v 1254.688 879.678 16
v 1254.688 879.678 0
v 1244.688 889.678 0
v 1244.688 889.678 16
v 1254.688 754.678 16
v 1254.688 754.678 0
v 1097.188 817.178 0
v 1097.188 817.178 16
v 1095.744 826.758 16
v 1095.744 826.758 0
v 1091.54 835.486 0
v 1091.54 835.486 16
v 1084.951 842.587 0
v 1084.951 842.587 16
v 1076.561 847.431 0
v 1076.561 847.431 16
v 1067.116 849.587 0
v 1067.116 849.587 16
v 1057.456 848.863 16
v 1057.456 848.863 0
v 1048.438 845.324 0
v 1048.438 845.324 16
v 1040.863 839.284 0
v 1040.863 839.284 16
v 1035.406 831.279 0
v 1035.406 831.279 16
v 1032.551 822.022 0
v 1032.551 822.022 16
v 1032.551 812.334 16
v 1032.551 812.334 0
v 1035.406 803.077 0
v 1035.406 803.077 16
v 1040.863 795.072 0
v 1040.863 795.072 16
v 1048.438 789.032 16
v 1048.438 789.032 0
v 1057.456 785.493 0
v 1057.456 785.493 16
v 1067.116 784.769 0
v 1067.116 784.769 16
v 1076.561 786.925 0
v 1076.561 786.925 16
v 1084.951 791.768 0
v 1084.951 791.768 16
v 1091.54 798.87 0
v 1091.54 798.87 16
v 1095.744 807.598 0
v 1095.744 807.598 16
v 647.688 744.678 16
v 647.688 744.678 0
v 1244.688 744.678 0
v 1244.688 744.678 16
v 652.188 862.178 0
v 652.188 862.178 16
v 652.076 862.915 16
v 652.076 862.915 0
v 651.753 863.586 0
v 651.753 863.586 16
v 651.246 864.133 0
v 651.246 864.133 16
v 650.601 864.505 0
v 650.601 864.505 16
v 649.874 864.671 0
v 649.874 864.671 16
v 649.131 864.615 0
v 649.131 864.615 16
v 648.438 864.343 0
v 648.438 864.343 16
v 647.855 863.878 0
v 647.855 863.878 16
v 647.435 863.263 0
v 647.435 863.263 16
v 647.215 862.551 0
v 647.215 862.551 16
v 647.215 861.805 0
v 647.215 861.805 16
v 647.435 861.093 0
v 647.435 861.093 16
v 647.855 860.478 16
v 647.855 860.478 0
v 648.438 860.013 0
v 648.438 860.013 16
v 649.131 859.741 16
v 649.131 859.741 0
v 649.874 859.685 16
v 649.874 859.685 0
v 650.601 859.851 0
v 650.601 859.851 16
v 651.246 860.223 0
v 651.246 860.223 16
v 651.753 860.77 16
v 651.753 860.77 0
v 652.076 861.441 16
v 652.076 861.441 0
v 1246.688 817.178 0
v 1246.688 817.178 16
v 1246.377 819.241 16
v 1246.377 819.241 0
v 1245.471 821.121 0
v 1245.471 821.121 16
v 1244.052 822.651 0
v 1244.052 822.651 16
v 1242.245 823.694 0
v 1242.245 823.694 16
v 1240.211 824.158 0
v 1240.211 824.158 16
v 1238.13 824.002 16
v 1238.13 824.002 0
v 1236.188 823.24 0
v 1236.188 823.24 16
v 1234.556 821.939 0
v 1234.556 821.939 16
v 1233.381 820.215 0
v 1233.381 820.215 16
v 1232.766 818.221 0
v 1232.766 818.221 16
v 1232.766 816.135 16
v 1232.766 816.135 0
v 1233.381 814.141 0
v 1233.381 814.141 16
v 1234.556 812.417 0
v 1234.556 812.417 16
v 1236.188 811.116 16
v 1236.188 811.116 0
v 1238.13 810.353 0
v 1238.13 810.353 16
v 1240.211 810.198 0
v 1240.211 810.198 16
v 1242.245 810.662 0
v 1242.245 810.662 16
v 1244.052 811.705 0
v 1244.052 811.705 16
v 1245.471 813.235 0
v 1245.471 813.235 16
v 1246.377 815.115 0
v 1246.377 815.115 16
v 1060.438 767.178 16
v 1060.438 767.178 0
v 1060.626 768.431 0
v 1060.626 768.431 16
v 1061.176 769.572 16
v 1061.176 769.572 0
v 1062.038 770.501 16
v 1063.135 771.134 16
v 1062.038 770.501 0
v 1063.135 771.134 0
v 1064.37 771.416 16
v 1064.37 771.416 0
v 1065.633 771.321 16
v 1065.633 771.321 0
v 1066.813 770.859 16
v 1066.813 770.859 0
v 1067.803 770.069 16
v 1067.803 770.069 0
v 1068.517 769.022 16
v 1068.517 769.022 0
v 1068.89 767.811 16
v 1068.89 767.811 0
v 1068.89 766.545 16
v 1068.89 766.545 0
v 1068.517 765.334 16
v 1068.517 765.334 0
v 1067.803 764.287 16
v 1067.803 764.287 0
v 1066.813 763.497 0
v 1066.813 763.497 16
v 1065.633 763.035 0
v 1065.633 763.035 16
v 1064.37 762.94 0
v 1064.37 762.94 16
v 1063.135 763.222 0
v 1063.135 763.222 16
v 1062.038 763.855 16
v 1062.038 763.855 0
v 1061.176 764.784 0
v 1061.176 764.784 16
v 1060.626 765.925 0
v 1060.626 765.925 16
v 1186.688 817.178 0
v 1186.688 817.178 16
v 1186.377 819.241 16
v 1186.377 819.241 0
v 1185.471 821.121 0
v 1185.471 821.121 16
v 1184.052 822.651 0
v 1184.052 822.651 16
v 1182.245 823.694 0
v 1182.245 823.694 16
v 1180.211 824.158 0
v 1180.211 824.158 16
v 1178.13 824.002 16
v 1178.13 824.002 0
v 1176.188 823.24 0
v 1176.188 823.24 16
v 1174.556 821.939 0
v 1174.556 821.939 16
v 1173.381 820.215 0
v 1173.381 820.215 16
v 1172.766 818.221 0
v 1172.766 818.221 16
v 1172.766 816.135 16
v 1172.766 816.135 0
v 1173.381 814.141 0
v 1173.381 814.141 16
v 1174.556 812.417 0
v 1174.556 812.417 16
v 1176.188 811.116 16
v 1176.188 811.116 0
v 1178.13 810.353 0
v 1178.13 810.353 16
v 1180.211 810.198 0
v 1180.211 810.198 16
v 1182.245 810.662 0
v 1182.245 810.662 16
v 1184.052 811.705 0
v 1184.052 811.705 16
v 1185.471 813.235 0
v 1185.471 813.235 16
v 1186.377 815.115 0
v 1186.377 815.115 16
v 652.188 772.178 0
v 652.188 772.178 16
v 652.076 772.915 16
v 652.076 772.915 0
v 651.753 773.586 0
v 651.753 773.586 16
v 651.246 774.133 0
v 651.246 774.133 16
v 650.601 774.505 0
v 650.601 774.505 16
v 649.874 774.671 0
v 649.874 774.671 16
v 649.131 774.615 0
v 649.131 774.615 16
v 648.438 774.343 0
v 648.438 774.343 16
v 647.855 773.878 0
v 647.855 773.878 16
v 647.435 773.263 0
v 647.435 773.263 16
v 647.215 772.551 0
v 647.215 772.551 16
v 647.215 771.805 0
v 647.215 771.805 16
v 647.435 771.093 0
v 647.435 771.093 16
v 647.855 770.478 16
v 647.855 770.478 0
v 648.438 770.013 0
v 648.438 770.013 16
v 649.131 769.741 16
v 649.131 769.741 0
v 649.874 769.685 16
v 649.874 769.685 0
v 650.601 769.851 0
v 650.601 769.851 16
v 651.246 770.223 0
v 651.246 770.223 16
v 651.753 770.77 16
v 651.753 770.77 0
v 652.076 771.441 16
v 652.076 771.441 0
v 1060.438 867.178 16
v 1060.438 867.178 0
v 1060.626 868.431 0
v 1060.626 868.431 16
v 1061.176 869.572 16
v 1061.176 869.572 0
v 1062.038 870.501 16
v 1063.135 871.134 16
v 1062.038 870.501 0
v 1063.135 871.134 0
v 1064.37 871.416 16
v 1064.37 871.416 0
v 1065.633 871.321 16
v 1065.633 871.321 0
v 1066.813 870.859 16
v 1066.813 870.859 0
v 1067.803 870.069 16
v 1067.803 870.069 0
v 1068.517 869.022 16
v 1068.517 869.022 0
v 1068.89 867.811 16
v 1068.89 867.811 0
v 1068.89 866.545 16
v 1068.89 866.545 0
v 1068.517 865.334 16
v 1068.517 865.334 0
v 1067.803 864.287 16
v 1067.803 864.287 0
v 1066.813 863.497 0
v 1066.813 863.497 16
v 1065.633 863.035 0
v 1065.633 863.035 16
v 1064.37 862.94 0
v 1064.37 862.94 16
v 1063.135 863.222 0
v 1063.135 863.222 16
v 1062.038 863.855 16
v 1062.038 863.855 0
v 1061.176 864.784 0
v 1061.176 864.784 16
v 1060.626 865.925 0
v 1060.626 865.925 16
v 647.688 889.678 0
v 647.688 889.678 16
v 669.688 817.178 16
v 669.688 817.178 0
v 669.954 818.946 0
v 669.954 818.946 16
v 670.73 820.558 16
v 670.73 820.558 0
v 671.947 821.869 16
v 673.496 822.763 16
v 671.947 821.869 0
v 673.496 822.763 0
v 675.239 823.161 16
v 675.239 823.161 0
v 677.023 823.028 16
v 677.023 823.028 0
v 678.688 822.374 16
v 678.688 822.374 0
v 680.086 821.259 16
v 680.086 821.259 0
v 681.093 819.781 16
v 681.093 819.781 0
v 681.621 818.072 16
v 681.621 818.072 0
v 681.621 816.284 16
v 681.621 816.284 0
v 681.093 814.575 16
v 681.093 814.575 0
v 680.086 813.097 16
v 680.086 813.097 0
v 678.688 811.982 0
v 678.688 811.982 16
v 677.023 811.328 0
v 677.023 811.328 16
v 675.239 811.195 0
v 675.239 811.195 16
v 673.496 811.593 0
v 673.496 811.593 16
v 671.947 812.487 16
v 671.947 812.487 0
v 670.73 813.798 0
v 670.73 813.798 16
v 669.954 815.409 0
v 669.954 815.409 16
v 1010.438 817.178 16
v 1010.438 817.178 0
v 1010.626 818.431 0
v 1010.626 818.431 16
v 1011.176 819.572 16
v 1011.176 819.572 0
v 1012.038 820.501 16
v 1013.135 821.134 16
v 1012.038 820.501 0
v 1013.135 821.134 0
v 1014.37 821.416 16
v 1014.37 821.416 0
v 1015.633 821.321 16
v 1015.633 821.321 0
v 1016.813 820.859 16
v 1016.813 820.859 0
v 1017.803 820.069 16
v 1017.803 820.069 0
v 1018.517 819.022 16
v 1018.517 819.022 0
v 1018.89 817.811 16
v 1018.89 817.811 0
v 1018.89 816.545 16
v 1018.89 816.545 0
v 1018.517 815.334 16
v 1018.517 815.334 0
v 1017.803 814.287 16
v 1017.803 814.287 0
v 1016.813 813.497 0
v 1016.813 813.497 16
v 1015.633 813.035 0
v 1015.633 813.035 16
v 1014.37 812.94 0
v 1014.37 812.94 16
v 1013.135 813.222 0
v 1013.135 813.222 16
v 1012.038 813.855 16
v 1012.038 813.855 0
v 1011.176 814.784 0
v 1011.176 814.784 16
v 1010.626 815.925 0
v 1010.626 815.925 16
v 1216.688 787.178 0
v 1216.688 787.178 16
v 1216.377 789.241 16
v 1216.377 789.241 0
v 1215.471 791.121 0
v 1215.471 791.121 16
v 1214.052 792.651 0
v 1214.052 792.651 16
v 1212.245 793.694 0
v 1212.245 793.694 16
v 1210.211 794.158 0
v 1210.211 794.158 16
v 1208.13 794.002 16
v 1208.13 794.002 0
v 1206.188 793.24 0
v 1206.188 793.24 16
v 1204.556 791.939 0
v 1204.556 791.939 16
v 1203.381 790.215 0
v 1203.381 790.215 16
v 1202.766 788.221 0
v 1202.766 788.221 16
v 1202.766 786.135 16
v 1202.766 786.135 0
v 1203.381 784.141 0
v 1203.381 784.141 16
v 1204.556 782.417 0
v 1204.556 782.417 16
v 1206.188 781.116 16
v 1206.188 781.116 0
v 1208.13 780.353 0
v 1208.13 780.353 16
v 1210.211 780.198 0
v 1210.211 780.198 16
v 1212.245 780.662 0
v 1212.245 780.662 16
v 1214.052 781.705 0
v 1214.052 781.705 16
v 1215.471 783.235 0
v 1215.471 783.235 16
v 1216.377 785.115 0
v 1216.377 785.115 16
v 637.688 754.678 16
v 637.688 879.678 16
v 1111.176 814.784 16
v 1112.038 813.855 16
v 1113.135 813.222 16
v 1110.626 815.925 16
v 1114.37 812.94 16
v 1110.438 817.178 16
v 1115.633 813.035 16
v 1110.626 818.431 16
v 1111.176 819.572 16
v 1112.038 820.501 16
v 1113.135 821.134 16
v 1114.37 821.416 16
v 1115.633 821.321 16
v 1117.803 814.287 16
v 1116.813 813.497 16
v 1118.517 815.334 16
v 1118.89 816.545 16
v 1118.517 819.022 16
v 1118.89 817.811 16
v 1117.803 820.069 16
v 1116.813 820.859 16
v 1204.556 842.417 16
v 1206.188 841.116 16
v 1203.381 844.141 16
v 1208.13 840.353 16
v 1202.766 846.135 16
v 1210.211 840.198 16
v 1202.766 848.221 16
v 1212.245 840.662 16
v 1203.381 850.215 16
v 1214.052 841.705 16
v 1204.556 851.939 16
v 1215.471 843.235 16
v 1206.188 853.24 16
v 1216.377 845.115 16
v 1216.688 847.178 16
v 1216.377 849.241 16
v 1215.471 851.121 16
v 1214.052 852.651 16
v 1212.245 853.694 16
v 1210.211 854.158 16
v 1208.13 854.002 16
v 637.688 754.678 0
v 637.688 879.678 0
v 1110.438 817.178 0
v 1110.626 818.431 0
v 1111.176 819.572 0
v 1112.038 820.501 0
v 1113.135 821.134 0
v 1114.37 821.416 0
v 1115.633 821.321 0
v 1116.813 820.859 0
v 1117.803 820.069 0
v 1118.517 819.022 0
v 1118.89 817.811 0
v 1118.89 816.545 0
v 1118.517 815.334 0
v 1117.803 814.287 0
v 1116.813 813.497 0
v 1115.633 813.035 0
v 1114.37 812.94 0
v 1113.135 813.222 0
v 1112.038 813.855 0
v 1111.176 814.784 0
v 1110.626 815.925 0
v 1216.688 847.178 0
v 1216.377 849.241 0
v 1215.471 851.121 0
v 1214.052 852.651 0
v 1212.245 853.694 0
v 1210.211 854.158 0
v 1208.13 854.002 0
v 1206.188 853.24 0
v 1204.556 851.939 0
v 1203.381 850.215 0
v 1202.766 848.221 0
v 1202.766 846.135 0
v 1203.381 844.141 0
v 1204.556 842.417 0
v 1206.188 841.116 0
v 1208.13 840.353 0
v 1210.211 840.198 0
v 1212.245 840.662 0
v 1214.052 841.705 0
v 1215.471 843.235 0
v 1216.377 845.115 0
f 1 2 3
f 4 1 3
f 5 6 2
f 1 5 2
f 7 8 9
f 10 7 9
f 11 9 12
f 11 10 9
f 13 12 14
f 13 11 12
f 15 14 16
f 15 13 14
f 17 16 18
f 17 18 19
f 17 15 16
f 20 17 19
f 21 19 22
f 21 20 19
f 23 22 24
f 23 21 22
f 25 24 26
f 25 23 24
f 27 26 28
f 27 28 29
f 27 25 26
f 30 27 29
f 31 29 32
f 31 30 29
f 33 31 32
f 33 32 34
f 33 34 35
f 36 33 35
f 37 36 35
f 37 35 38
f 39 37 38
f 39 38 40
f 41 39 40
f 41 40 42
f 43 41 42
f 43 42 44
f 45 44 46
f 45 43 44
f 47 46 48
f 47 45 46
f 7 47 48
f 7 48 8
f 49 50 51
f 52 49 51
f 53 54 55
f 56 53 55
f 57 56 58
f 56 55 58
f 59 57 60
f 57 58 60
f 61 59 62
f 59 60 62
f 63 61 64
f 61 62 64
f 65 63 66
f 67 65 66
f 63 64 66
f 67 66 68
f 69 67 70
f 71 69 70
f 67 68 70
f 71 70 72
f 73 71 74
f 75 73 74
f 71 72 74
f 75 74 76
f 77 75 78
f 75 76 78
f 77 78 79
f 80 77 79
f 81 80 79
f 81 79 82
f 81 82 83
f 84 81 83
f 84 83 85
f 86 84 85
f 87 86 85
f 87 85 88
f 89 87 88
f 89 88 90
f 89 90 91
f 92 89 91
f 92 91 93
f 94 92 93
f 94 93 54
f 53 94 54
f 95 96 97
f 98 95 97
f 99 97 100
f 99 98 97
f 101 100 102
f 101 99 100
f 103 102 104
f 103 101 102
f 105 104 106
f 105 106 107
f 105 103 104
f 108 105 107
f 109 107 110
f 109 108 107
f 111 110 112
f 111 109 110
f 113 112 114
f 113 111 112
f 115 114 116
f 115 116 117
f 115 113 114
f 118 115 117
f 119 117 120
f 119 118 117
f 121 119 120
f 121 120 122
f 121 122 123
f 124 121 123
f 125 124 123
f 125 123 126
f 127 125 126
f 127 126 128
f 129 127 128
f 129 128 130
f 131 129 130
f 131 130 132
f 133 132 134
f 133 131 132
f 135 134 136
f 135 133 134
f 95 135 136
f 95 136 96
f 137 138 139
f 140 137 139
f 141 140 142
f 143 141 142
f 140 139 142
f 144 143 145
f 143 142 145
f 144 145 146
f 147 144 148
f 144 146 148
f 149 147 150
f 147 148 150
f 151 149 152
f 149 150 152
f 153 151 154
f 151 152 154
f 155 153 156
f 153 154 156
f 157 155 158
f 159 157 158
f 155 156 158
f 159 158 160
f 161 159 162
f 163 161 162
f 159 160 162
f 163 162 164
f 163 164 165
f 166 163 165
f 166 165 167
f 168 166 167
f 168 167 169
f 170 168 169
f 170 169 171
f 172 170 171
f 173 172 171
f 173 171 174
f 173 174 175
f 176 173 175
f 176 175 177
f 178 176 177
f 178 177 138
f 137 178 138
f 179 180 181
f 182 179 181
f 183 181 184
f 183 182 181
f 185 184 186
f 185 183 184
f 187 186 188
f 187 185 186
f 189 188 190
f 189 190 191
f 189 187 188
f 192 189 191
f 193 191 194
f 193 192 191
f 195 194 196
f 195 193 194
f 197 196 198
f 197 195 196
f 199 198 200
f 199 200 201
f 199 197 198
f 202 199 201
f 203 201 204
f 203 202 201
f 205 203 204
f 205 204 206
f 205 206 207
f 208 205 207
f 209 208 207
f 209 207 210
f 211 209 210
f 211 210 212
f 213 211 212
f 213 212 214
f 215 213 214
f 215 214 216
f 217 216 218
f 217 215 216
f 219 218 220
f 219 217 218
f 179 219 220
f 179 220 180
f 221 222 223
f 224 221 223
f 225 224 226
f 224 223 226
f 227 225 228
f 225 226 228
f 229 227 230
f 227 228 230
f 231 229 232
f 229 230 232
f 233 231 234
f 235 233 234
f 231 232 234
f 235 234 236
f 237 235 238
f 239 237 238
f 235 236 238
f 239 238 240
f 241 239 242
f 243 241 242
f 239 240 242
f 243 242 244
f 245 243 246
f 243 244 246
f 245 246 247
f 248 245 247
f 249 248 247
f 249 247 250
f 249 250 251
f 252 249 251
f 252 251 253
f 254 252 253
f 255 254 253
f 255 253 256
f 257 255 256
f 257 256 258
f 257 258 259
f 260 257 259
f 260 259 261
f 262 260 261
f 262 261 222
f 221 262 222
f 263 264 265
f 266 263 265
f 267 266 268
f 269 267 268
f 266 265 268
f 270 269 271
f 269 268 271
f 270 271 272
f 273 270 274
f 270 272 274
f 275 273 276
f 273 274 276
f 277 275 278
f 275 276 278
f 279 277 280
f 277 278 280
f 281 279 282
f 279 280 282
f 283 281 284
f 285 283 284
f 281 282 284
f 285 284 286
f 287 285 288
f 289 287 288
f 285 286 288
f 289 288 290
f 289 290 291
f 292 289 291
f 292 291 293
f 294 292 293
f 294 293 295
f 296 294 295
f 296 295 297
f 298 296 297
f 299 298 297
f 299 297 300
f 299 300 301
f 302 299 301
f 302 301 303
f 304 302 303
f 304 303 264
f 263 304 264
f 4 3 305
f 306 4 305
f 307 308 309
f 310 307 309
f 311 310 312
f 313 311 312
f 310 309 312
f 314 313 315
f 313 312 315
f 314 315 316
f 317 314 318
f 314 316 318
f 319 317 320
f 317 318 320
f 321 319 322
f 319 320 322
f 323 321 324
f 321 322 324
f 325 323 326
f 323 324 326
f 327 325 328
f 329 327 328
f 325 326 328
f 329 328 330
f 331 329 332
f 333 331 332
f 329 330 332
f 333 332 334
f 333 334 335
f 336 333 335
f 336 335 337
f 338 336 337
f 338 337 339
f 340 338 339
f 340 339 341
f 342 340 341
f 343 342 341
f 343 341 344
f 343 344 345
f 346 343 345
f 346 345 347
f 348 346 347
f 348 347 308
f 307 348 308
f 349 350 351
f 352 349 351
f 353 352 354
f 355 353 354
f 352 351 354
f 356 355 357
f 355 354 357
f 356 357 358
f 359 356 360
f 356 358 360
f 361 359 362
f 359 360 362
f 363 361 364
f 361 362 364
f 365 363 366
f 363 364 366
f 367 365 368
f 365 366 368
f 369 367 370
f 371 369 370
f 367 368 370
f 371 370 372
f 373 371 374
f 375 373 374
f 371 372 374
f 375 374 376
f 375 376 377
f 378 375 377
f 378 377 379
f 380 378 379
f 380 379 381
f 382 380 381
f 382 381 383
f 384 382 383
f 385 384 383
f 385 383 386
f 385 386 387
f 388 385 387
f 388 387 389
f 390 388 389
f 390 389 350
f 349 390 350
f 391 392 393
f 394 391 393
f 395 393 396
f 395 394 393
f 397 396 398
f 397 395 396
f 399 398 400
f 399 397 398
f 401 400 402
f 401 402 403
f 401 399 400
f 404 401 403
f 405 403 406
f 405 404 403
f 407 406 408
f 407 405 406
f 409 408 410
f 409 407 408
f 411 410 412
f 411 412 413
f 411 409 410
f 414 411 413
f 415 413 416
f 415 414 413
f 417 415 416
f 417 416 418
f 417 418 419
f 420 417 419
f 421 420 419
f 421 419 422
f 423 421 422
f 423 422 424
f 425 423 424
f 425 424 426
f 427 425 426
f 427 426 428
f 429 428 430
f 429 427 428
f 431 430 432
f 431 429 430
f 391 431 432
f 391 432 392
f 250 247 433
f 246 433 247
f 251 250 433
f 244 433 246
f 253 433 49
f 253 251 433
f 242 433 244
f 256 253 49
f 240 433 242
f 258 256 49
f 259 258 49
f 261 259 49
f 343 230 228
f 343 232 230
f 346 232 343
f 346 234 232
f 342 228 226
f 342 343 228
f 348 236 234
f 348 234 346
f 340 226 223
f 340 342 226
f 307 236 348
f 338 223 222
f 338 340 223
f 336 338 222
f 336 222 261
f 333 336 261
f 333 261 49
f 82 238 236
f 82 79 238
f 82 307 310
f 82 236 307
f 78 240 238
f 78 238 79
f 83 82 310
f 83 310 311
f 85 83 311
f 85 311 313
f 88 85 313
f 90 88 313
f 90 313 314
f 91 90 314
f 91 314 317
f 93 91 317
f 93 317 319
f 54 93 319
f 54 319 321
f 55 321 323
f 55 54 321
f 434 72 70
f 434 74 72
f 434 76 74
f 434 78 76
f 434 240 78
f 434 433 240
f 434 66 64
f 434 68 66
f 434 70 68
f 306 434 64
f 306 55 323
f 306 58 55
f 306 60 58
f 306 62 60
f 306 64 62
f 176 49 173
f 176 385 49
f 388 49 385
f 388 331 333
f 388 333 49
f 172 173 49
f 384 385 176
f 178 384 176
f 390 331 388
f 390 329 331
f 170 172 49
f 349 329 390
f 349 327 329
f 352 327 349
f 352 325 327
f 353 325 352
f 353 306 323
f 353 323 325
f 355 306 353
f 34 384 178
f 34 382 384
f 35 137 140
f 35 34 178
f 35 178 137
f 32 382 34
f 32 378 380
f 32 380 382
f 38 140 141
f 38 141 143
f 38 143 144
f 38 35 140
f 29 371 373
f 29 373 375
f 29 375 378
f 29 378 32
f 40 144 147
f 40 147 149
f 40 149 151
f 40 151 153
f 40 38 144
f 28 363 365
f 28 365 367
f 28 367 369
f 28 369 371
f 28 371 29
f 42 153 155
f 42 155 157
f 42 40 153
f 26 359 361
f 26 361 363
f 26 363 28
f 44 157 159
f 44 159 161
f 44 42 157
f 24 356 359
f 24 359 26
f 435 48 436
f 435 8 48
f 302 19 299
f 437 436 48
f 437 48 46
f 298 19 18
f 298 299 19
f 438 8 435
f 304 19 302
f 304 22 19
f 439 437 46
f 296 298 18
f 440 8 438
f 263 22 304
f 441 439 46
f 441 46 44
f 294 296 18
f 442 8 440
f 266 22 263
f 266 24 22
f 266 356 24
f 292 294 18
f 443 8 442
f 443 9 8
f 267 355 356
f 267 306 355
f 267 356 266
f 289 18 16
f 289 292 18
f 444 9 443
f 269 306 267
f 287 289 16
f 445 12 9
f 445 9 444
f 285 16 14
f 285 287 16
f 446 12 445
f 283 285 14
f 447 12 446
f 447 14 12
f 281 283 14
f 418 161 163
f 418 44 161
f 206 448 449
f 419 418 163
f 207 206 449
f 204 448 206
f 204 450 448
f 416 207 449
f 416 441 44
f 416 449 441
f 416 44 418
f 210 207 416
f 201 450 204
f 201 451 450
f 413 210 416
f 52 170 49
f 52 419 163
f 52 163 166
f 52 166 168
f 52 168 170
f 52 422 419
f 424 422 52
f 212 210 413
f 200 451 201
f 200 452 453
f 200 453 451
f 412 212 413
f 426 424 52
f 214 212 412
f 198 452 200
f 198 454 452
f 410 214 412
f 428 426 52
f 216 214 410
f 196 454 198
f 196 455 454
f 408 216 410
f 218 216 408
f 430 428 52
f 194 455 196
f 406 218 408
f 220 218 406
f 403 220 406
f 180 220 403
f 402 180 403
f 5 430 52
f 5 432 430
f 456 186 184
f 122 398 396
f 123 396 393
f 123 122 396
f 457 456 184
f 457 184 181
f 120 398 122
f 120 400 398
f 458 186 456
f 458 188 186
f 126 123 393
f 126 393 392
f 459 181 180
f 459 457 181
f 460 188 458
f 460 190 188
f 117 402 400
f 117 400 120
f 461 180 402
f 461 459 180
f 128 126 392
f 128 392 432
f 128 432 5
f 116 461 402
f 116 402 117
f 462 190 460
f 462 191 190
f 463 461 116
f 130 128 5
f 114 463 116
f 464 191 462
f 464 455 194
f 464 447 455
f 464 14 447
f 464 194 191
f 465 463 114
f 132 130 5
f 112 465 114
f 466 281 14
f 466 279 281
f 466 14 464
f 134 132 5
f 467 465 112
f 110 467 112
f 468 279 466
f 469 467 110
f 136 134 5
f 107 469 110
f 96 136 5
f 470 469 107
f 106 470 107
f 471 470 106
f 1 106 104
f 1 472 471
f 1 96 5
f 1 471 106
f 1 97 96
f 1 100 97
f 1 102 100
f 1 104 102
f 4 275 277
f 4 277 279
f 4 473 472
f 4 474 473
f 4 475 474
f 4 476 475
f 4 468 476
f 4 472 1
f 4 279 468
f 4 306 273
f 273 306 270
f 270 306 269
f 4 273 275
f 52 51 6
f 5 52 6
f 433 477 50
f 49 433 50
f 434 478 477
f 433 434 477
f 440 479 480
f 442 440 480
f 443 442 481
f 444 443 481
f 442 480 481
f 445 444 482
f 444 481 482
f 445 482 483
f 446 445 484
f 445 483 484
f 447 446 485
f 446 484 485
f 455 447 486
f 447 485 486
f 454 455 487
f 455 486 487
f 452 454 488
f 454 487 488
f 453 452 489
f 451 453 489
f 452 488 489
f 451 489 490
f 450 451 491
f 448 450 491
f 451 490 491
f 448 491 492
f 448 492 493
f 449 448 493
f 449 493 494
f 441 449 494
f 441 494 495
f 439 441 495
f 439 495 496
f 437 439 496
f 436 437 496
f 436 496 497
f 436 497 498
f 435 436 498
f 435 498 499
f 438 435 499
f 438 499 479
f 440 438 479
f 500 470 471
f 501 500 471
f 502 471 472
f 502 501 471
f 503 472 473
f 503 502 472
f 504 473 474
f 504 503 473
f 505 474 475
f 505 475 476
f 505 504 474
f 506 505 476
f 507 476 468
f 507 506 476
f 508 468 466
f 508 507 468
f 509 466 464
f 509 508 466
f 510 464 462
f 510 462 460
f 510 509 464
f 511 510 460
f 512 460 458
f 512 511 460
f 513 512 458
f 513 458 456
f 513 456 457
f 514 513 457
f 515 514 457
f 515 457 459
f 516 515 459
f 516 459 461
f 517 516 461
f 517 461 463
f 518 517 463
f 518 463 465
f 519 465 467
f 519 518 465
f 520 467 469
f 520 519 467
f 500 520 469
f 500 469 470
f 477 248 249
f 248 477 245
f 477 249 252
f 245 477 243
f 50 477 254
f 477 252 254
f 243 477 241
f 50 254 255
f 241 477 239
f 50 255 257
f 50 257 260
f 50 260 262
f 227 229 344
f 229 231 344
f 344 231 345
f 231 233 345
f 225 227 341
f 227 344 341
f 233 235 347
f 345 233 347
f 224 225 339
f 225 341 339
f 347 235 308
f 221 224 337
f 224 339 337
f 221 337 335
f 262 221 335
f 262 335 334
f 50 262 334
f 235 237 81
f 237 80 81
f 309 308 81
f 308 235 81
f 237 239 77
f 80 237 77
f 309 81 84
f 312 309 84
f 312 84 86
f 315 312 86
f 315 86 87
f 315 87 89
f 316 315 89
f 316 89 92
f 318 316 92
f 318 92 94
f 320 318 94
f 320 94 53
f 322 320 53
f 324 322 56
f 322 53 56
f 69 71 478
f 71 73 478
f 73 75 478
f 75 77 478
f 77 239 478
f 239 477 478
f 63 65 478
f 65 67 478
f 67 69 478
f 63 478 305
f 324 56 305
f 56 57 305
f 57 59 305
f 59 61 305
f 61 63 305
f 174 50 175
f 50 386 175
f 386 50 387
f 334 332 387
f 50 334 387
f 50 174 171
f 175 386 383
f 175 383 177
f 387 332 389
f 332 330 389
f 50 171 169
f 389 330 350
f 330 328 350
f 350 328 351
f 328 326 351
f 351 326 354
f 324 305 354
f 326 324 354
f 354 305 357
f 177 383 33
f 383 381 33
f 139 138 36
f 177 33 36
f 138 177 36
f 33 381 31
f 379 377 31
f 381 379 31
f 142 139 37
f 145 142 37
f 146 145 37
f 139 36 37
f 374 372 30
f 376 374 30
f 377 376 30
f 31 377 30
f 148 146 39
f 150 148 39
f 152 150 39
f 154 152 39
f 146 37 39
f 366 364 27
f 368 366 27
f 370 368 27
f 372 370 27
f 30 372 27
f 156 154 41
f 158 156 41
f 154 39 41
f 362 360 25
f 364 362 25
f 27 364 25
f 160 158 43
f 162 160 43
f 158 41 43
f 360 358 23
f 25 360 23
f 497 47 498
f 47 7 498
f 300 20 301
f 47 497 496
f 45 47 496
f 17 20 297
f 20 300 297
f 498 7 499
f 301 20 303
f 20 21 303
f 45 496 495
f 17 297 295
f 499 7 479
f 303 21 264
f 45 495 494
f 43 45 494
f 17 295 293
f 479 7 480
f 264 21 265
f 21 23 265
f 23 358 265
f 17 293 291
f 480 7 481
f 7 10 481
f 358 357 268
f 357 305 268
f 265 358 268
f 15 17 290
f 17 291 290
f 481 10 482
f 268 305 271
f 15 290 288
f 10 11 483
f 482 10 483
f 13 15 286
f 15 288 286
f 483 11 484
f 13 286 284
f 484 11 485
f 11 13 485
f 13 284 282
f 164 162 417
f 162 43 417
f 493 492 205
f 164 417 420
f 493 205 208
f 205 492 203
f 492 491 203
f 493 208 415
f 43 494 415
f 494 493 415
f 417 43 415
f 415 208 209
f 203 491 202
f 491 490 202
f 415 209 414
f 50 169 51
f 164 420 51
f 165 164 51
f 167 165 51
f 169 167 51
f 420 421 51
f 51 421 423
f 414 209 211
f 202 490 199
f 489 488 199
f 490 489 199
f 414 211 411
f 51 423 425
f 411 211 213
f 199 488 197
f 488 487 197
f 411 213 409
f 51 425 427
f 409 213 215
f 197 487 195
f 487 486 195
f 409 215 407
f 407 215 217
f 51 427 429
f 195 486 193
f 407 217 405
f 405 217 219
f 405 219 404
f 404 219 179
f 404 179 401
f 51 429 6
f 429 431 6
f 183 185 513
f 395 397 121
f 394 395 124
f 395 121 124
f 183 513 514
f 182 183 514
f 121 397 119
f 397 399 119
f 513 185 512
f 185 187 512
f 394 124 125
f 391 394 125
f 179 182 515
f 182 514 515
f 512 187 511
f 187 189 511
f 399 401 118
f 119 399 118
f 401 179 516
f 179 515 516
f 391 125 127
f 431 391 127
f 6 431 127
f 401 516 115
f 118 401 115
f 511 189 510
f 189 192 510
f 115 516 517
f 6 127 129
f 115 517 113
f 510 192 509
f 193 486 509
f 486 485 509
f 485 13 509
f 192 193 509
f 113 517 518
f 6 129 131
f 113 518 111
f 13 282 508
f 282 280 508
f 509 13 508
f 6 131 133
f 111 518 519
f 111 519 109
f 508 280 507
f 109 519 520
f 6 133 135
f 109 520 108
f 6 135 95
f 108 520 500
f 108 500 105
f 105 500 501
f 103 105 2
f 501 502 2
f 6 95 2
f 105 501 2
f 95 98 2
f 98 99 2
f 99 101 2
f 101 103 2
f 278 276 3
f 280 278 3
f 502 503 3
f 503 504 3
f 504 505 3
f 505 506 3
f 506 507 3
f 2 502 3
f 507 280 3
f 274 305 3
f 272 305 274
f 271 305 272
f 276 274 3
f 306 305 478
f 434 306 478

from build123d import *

# Parameters (mm, degrees)
SKETCH_1_R              = 7
SKETCH_1_R_2            = 3
SKETCH_1_R_3            = 32.5
EXTRUDE_1_DEPTH         = 16
HOLE_WIZARD_M14_1_D     = 12
HOLE_WIZARD_M14_1_DEPTH = 34
HOLE_WIZARD_M14_1_TIP   = 3.605163714
HOLE_WIZARD_M6_1_D      = 5
HOLE_WIZARD_M6_1_DEPTH  = 18
HOLE_WIZARD_M6_1_TIP    = 1.502151548
HOLE_WIZARD_M10_2_D     = 8.5
HOLE_WIZARD_M10_2_DEPTH = 24.5
HOLE_WIZARD_M10_2_TIP   = 2.553657631


with BuildPart() as part:
    # 草图1 → 凸台-拉伸1 (new body)
    with BuildSketch(Plane.XY):
        Polygon((637.687566056, 879.677968159), (637.687566056, 754.677968159), (647.687566056, 744.677968159), (1244.687566056, 744.677968159), (1254.687566056, 754.677968159), (1254.687566056, 879.677968159), (1244.687566056, 889.677968159), (647.687566056, 889.677968159), align=None)
        with Locations((1209.687566056, 787.177968159)):
            Circle(SKETCH_1_R, mode=Mode.SUBTRACT)
        with Locations((1064.687566056, 767.177968159)):
            Circle(SKETCH_1_R_2, mode=Mode.SUBTRACT)
        with Locations((1064.687566056, 817.177968159)):
            Circle(SKETCH_1_R_3, mode=Mode.SUBTRACT)
        with Locations((1014.687566056, 817.177968159)):
            Circle(SKETCH_1_R_2, mode=Mode.SUBTRACT)
        with Locations((1114.687566056, 817.177968159)):
            Circle(SKETCH_1_R_2, mode=Mode.SUBTRACT)
        with Locations((1064.687566056, 867.177968159)):
            Circle(SKETCH_1_R_2, mode=Mode.SUBTRACT)
        with Locations((1239.687566056, 817.177968159)):
            Circle(SKETCH_1_R, mode=Mode.SUBTRACT)
        with Locations((1179.687566056, 817.177968159)):
            Circle(SKETCH_1_R, mode=Mode.SUBTRACT)
        with Locations((1209.687566056, 847.177968159)):
            Circle(SKETCH_1_R, mode=Mode.SUBTRACT)
    extrude(amount=EXTRUDE_1_DEPTH)

    # M14 螺纹孔1
    with Locations(Plane.XY.offset(16)):
        with Locations((675.687566056, 817.177968159)):
            Hole(HOLE_WIZARD_M14_1_D / 2, depth=HOLE_WIZARD_M14_1_DEPTH)
            with Locations((0, 0, -(HOLE_WIZARD_M14_1_DEPTH + HOLE_WIZARD_M14_1_TIP / 2))):  # 118° drill point
                Cone(0, HOLE_WIZARD_M14_1_D / 2, HOLE_WIZARD_M14_1_TIP, mode=Mode.SUBTRACT)

    # M6 螺纹孔1
    with Locations(Plane(origin=(0, 0, 0), x_dir=(-1, 0, 0), z_dir=(0, 0, -1))):
        with Locations((-649.687566056, 772.177968159), (-649.687566056, 862.177968159)):
            Hole(HOLE_WIZARD_M6_1_D / 2, depth=HOLE_WIZARD_M6_1_DEPTH)
            with Locations((0, 0, -(HOLE_WIZARD_M6_1_DEPTH + HOLE_WIZARD_M6_1_TIP / 2))):  # 118° drill point
                Cone(0, HOLE_WIZARD_M6_1_D / 2, HOLE_WIZARD_M6_1_TIP, mode=Mode.SUBTRACT)

    # M10 螺纹孔2
    with Locations(Plane.XY.offset(16)):
        with Locations((1014.687566056, 817.177968159), (1064.687566056, 767.177968159), (1114.687566056, 817.177968159), (1064.687566056, 867.177968159)):
            Hole(HOLE_WIZARD_M10_2_D / 2, depth=HOLE_WIZARD_M10_2_DEPTH)
            with Locations((0, 0, -(HOLE_WIZARD_M10_2_DEPTH + HOLE_WIZARD_M10_2_TIP / 2))):  # 118° drill point
                Cone(0, HOLE_WIZARD_M10_2_D / 2, HOLE_WIZARD_M10_2_TIP, mode=Mode.SUBTRACT)


solid = part.part
